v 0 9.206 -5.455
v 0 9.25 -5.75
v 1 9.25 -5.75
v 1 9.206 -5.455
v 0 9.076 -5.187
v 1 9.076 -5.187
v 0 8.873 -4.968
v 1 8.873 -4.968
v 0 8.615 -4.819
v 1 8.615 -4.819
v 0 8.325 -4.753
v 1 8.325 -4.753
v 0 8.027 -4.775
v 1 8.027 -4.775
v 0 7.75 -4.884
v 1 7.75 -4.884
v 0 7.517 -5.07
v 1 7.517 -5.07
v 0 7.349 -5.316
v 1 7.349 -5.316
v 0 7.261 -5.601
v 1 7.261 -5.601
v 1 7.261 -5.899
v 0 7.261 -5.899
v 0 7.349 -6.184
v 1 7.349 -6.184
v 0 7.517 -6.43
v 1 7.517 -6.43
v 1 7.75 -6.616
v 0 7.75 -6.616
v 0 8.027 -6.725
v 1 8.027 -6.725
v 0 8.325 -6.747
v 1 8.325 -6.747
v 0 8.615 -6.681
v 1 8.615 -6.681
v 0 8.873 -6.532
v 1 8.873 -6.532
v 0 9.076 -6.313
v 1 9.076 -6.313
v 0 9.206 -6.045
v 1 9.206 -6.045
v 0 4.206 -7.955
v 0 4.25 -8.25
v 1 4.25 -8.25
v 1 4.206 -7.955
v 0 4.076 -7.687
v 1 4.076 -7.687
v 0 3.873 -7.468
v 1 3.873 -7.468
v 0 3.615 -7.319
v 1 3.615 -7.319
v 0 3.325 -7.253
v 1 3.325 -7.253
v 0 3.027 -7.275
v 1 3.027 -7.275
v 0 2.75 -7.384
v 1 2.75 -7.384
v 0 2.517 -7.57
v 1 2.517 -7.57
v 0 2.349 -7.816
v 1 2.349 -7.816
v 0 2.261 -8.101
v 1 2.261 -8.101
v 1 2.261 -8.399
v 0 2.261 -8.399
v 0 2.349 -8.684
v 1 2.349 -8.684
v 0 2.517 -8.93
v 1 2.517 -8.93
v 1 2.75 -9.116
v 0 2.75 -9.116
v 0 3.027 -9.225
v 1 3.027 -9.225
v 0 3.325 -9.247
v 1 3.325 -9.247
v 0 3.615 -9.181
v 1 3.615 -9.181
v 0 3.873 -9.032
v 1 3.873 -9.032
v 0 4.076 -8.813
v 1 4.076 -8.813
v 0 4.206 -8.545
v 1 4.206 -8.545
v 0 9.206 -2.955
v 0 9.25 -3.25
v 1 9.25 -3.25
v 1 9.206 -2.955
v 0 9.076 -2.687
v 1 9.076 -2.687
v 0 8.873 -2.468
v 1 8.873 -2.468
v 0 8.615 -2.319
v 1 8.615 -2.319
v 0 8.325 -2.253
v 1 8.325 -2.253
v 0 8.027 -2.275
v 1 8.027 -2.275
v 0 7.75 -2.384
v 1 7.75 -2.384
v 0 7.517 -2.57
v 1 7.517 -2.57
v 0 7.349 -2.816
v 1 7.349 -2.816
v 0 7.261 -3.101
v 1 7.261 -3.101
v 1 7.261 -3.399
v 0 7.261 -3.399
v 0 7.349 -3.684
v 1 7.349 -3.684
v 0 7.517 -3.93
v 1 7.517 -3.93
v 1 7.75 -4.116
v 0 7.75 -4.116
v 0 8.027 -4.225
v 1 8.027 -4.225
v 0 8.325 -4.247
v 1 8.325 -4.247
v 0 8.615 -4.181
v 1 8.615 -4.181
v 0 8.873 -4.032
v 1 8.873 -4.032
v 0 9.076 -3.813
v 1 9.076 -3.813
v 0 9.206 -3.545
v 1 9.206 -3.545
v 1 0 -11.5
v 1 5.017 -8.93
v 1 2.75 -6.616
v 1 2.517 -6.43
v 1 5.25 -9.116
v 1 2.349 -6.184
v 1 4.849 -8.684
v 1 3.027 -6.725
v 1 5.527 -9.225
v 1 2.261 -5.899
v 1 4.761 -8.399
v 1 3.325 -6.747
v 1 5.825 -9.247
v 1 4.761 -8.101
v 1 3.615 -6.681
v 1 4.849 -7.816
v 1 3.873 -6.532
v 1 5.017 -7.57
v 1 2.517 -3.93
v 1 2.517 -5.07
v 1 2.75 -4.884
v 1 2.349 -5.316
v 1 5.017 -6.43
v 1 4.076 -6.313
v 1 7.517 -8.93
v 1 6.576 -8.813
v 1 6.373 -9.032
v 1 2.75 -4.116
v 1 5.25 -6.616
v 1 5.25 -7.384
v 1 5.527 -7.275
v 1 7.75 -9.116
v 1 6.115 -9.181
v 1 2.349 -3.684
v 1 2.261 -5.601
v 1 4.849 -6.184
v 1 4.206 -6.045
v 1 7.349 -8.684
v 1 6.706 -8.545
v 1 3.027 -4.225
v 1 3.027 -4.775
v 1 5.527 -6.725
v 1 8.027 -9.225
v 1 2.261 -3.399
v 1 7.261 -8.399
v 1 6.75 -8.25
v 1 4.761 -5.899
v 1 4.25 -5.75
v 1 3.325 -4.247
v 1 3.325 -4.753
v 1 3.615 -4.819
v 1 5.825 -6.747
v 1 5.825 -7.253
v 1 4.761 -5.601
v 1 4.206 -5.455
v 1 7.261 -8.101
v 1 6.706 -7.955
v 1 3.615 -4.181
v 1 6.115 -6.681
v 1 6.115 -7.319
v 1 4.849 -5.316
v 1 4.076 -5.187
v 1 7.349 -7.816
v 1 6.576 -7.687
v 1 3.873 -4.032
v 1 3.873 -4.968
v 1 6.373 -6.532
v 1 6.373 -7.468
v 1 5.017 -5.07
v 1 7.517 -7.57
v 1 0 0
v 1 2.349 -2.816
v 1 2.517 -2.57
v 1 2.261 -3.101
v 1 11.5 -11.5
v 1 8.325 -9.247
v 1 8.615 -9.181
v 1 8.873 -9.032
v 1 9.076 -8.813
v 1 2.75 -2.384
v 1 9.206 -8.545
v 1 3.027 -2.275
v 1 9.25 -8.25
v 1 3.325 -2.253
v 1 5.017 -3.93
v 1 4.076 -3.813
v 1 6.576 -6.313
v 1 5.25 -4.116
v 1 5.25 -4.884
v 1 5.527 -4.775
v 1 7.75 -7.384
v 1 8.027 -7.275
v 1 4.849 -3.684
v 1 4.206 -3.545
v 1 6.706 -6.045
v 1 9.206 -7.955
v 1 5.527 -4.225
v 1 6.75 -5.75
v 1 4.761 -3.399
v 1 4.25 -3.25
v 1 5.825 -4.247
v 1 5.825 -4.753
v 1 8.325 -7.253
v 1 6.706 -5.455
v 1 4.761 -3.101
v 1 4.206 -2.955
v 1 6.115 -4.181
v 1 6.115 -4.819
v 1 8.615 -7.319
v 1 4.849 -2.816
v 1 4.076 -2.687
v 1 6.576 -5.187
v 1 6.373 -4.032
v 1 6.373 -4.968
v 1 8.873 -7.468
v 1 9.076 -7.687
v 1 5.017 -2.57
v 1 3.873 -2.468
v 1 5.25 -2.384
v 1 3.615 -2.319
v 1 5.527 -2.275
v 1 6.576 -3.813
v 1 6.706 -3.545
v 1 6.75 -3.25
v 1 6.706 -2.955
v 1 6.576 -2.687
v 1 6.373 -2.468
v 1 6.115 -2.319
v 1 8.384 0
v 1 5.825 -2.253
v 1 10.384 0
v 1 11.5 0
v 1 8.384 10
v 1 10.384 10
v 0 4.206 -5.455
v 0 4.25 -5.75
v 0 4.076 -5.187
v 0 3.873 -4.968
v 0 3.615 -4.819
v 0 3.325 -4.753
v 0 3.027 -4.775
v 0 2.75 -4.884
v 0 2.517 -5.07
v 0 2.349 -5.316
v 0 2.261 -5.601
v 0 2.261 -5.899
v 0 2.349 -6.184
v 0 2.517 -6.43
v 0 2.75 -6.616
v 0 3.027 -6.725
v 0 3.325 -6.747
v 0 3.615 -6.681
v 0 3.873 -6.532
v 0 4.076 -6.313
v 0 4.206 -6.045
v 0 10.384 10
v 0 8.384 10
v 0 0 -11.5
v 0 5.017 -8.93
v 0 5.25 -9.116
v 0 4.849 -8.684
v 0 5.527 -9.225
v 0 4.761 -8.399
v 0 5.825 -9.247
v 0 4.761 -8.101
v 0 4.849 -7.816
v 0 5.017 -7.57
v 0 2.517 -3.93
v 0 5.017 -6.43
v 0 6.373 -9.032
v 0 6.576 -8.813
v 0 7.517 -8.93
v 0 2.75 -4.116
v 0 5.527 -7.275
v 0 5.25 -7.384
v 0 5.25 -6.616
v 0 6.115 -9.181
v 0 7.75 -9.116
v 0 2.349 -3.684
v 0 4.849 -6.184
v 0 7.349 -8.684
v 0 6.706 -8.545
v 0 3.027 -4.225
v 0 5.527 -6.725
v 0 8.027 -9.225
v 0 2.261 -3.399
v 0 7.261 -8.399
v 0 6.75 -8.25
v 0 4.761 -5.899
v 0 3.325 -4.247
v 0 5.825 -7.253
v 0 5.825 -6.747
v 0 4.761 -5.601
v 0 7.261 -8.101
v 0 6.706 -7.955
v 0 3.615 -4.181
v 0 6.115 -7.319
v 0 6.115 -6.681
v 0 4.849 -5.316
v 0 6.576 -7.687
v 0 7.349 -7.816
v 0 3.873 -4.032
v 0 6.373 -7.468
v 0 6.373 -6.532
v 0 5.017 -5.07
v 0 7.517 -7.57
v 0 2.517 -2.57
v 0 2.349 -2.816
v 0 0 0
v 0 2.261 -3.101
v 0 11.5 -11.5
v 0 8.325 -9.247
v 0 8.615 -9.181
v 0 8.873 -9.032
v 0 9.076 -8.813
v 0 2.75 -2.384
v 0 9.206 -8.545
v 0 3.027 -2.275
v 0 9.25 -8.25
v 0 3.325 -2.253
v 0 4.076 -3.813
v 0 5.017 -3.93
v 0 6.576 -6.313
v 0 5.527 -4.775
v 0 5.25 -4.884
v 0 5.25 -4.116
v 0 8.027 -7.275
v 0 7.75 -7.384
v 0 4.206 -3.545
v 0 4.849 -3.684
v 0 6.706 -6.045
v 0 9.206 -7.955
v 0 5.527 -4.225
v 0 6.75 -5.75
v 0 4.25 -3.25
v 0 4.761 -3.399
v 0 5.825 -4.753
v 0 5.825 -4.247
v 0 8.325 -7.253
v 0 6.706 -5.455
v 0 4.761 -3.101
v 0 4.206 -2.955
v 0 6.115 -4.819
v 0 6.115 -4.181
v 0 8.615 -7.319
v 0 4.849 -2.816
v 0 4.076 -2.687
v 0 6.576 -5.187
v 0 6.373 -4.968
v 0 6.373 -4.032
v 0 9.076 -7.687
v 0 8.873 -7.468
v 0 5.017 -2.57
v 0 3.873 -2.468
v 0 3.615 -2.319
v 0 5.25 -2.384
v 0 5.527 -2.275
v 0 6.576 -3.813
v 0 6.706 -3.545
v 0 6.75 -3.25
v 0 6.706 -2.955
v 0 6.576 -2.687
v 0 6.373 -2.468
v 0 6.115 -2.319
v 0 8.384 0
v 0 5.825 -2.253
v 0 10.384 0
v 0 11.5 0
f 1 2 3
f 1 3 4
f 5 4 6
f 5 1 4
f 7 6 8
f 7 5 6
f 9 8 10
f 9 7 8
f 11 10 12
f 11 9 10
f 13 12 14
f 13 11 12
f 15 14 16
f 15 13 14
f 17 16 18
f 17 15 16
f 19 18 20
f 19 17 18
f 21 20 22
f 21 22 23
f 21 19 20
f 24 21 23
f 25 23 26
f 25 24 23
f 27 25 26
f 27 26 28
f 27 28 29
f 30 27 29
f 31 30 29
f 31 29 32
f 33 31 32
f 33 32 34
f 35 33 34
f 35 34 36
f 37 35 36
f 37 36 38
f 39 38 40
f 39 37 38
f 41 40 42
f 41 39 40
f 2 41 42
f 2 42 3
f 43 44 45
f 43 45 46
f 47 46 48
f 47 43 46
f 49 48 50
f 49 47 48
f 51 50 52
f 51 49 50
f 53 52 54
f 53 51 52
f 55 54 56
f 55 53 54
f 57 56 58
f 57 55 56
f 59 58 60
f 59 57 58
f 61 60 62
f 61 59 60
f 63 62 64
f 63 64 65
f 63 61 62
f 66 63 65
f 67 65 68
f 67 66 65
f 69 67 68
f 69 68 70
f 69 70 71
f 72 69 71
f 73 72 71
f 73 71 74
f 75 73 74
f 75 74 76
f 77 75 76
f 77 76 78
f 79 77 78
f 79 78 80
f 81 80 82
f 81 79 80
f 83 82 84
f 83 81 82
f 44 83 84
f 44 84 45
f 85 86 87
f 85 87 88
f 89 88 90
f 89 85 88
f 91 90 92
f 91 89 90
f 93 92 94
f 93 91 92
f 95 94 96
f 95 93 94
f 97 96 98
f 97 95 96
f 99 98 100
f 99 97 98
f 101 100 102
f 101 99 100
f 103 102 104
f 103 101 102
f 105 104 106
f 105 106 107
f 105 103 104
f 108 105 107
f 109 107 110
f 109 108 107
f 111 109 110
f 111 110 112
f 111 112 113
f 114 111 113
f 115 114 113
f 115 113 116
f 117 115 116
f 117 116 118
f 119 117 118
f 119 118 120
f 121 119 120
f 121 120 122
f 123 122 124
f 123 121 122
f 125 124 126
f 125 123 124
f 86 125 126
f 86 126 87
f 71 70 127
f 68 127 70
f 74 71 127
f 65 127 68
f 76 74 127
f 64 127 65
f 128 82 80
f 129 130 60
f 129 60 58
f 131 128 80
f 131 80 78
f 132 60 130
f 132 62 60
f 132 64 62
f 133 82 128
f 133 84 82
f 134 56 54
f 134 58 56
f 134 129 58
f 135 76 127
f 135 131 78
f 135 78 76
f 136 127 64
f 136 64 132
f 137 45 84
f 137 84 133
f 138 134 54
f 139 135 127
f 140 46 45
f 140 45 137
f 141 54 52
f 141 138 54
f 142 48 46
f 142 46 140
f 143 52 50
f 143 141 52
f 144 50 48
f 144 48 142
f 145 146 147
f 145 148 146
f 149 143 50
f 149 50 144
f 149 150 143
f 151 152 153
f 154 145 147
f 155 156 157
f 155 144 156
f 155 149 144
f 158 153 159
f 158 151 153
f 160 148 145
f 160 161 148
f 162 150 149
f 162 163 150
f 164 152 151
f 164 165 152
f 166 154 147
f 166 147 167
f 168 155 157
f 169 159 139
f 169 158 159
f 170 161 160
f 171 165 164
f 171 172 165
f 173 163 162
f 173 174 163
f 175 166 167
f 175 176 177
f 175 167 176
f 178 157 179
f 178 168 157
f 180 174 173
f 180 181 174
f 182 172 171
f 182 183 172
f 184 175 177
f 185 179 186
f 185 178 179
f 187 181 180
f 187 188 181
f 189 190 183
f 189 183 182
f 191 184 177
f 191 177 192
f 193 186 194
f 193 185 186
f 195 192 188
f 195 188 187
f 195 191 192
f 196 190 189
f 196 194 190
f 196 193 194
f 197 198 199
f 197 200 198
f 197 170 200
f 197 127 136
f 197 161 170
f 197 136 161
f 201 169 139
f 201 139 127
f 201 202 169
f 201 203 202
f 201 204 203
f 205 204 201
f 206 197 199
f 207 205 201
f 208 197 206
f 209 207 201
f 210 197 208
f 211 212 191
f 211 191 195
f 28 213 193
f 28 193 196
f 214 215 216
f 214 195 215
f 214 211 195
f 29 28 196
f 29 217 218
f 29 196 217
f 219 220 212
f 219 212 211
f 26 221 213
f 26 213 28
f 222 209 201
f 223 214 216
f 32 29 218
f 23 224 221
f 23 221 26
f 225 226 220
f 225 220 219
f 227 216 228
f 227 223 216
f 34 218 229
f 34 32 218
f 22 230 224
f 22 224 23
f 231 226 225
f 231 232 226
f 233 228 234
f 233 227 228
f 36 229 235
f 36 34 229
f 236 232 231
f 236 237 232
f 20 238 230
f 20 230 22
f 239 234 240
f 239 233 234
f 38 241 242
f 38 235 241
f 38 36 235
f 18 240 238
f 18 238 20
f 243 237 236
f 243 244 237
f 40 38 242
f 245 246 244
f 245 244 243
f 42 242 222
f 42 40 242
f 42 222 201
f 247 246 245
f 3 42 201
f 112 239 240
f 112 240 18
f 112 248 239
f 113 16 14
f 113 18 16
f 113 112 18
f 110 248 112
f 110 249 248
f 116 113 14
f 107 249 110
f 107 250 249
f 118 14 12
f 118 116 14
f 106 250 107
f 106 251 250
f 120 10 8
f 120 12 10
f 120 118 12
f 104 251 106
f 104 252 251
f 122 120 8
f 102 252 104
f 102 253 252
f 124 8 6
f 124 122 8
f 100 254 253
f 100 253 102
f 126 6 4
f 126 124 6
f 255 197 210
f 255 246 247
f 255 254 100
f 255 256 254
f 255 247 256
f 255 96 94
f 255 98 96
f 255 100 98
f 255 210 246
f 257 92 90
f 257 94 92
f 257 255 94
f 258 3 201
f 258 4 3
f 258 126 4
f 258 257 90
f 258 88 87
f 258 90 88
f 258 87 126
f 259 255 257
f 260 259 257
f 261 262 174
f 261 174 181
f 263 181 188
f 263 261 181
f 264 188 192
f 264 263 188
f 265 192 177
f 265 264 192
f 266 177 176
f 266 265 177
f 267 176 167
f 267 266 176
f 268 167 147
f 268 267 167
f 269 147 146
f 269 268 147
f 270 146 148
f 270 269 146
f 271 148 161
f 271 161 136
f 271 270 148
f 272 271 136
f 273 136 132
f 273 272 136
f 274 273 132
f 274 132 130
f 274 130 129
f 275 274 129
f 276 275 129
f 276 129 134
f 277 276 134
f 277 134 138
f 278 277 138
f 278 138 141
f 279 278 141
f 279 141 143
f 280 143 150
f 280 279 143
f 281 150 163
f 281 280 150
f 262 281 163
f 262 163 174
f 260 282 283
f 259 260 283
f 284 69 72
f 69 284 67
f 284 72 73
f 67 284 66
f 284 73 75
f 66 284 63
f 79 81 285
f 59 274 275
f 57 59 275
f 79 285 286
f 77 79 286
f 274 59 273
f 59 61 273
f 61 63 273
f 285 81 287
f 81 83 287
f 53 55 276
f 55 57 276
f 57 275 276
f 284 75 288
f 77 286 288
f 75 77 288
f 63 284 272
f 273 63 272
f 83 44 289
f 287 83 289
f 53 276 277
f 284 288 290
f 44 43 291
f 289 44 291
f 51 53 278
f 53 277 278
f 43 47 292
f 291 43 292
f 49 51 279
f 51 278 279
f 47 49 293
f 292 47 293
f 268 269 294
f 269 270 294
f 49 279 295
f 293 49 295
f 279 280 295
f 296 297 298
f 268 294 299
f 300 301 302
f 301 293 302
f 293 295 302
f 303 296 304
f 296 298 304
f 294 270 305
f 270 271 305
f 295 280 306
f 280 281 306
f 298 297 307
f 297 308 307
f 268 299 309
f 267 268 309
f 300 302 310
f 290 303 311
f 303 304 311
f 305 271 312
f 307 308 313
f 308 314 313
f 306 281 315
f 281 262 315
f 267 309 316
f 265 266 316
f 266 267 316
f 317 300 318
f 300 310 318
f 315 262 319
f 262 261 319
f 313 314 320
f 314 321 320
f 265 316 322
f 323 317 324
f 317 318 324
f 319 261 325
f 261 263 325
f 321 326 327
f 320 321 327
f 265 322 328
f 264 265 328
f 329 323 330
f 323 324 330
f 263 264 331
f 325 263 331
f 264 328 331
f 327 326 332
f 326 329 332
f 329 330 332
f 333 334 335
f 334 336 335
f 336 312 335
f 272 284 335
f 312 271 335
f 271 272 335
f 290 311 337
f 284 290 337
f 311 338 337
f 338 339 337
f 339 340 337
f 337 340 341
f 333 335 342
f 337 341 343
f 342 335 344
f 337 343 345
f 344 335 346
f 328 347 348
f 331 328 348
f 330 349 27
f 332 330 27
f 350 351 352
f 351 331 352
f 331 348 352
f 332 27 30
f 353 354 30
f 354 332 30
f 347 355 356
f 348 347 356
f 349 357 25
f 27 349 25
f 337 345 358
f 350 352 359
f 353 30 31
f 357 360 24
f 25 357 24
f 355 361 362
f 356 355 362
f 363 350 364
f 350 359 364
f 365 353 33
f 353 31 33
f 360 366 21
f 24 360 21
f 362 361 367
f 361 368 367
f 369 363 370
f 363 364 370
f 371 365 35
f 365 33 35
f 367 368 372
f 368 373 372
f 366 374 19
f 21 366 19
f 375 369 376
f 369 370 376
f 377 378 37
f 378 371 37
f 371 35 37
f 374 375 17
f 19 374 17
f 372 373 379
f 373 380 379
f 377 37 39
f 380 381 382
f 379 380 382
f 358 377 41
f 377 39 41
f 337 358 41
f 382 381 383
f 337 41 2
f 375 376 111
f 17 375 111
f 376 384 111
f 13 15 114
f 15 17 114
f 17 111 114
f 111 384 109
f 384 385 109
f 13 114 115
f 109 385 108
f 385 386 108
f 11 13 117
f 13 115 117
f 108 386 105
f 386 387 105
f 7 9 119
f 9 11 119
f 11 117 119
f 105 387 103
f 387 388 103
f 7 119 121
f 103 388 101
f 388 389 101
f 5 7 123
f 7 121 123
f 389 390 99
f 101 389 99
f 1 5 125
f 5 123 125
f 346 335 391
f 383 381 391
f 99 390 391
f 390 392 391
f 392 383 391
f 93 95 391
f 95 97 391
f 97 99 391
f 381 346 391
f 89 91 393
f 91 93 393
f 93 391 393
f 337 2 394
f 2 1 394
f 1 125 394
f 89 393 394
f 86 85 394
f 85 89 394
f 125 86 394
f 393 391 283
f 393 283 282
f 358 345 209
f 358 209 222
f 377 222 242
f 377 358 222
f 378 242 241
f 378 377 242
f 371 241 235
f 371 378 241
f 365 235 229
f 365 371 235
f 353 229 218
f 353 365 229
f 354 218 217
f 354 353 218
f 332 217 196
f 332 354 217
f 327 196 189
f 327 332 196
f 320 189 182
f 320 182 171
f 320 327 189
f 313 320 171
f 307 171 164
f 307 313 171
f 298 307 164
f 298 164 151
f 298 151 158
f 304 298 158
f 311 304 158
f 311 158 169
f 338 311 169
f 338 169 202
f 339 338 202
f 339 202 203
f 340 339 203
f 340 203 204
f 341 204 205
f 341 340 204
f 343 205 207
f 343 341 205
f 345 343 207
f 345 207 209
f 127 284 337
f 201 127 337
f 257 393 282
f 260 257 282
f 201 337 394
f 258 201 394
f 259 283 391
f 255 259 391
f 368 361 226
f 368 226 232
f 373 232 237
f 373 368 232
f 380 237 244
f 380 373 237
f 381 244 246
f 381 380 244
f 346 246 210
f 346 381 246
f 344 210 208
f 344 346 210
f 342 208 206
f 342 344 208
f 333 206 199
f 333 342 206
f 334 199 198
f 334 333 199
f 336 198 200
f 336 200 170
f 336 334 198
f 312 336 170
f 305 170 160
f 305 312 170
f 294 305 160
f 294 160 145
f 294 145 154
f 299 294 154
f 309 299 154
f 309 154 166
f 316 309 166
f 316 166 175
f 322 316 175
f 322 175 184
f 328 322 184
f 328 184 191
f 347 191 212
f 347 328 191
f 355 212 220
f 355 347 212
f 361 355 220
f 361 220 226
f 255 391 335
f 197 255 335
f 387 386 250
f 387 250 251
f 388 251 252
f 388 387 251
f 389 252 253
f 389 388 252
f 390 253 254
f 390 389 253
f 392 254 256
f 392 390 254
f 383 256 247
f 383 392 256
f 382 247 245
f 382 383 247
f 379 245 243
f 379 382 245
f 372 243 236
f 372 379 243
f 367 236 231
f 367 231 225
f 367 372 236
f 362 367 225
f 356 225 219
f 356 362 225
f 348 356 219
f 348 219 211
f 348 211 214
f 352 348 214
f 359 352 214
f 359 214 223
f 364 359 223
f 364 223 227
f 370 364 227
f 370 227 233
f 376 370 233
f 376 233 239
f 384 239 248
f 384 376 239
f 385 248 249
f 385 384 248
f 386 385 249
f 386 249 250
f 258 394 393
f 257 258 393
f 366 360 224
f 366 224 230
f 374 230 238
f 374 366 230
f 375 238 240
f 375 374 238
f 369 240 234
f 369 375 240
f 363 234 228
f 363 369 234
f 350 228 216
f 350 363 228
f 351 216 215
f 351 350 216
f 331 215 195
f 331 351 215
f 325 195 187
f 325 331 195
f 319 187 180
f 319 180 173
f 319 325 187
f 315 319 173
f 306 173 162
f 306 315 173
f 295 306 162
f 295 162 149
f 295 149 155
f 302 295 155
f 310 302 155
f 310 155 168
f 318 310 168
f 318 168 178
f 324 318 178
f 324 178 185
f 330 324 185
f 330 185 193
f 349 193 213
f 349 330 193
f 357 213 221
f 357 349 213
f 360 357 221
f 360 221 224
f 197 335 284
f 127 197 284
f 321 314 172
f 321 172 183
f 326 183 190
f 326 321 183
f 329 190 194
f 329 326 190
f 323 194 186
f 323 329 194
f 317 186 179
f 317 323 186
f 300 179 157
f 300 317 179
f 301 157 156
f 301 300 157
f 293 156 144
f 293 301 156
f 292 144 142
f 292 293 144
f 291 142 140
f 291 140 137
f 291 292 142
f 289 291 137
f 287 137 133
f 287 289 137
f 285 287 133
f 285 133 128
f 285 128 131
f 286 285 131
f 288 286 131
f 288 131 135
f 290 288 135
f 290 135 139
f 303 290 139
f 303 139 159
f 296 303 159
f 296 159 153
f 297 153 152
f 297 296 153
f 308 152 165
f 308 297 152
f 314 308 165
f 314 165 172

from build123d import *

# Parameters (mm, degrees)
F0_R     = 1
F1_DEPTH = 1


# Not quite as in the source:
# - a feature names something its author has since deleted; it is built from what else it names


with BuildPart() as f1:
    # F0 (on Right) → F1 (new body)
    with BuildSketch(Plane.YZ):
        Polygon((8.384144865, 0), (0, 0), (0, -11.5), (11.5, -11.5), (11.5, 0), (10.384144865, 0), (10.384144865, 10), (8.384144865, 10), align=None)
        with Locations((3.25, -8.25)):
            Circle(F0_R, mode=Mode.SUBTRACT)
        with Locations((3.25, -5.75)):
            Circle(F0_R, mode=Mode.SUBTRACT)
        with Locations((3.25, -3.25)):
            Circle(F0_R, mode=Mode.SUBTRACT)
        with Locations((5.75, -8.25)):
            Circle(F0_R, mode=Mode.SUBTRACT)
        with Locations((8.25, -8.25)):
            Circle(F0_R, mode=Mode.SUBTRACT)
        with Locations((5.75, -5.75)):
            Circle(F0_R, mode=Mode.SUBTRACT)
        with Locations((8.25, -5.75)):
            Circle(F0_R, mode=Mode.SUBTRACT)
        with Locations((5.75, -3.25)):
            Circle(F0_R, mode=Mode.SUBTRACT)
        with Locations((8.25, -3.25)):
            Circle(F0_R, mode=Mode.SUBTRACT)
    extrude(amount=F1_DEPTH)


solid = f1.part
